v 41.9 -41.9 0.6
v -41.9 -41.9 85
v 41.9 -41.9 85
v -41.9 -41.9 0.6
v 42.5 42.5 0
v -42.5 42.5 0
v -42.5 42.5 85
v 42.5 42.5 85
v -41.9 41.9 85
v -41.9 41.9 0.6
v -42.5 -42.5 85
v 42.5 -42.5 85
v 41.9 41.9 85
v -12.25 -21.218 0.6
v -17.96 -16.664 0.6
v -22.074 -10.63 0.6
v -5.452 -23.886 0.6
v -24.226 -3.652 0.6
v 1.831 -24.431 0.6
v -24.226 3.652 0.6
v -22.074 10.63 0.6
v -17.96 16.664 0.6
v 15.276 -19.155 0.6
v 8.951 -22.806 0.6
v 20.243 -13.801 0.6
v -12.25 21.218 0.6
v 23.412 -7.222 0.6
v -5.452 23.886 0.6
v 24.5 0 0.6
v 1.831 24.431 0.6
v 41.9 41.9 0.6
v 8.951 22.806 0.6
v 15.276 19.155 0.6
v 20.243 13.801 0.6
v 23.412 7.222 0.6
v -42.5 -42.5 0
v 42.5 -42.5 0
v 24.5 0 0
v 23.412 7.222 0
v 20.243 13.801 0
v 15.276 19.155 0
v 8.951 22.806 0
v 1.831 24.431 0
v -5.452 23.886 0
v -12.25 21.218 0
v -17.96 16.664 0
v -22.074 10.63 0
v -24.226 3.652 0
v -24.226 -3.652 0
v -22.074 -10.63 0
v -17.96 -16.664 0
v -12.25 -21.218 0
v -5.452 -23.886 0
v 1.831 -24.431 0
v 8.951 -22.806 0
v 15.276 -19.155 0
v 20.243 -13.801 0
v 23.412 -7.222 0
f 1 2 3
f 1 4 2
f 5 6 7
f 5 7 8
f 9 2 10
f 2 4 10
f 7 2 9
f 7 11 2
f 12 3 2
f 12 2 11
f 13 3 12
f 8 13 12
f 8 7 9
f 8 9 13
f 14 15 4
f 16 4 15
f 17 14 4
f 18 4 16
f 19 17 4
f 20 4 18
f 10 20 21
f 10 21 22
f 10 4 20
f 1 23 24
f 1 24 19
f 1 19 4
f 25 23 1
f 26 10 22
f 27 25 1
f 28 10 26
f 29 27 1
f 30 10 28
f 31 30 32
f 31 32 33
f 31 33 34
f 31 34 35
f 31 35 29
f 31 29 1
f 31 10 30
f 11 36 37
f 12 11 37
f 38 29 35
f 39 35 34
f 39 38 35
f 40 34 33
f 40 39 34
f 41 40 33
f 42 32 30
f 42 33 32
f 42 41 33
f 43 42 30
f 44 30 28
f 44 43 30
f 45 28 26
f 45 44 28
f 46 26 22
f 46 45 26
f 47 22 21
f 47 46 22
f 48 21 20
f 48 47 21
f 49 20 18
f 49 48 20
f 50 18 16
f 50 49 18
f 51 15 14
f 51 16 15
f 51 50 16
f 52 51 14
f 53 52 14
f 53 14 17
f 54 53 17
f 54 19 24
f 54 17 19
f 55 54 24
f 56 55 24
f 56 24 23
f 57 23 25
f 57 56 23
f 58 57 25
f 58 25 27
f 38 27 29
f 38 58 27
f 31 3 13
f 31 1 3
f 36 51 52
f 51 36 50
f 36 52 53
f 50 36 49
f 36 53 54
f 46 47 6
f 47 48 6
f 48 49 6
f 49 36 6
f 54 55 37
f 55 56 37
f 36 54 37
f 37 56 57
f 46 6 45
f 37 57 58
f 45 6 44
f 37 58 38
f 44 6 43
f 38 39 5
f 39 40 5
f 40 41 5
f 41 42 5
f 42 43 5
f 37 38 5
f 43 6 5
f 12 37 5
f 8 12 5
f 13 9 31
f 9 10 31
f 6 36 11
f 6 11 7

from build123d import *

# Parameters (mm, degrees)
F0_W     = 85
F0_H     = 85
F1_DEPTH = 85
F2_T     = -0.6
F3_R     = 24.5
F4_DEPTH = 25


with BuildPart() as f1:
    # F0 (on Top) → F1 (new body)
    with BuildSketch(Plane.XY):
        Rectangle(F0_W, F0_H)
    extrude(amount=F1_DEPTH)

    # F2
    f2_openings = [f1.faces().sort_by_distance(p)[0] for p in [
        (0, 0, 85),
    ]]
    offset(amount=F2_T, openings=f2_openings)

    # F3 (on Top) → F4 (cut)
    with BuildSketch(Plane.XY):
        Circle(F3_R)
    extrude(amount=F4_DEPTH, mode=Mode.SUBTRACT)


solid = f1.part
